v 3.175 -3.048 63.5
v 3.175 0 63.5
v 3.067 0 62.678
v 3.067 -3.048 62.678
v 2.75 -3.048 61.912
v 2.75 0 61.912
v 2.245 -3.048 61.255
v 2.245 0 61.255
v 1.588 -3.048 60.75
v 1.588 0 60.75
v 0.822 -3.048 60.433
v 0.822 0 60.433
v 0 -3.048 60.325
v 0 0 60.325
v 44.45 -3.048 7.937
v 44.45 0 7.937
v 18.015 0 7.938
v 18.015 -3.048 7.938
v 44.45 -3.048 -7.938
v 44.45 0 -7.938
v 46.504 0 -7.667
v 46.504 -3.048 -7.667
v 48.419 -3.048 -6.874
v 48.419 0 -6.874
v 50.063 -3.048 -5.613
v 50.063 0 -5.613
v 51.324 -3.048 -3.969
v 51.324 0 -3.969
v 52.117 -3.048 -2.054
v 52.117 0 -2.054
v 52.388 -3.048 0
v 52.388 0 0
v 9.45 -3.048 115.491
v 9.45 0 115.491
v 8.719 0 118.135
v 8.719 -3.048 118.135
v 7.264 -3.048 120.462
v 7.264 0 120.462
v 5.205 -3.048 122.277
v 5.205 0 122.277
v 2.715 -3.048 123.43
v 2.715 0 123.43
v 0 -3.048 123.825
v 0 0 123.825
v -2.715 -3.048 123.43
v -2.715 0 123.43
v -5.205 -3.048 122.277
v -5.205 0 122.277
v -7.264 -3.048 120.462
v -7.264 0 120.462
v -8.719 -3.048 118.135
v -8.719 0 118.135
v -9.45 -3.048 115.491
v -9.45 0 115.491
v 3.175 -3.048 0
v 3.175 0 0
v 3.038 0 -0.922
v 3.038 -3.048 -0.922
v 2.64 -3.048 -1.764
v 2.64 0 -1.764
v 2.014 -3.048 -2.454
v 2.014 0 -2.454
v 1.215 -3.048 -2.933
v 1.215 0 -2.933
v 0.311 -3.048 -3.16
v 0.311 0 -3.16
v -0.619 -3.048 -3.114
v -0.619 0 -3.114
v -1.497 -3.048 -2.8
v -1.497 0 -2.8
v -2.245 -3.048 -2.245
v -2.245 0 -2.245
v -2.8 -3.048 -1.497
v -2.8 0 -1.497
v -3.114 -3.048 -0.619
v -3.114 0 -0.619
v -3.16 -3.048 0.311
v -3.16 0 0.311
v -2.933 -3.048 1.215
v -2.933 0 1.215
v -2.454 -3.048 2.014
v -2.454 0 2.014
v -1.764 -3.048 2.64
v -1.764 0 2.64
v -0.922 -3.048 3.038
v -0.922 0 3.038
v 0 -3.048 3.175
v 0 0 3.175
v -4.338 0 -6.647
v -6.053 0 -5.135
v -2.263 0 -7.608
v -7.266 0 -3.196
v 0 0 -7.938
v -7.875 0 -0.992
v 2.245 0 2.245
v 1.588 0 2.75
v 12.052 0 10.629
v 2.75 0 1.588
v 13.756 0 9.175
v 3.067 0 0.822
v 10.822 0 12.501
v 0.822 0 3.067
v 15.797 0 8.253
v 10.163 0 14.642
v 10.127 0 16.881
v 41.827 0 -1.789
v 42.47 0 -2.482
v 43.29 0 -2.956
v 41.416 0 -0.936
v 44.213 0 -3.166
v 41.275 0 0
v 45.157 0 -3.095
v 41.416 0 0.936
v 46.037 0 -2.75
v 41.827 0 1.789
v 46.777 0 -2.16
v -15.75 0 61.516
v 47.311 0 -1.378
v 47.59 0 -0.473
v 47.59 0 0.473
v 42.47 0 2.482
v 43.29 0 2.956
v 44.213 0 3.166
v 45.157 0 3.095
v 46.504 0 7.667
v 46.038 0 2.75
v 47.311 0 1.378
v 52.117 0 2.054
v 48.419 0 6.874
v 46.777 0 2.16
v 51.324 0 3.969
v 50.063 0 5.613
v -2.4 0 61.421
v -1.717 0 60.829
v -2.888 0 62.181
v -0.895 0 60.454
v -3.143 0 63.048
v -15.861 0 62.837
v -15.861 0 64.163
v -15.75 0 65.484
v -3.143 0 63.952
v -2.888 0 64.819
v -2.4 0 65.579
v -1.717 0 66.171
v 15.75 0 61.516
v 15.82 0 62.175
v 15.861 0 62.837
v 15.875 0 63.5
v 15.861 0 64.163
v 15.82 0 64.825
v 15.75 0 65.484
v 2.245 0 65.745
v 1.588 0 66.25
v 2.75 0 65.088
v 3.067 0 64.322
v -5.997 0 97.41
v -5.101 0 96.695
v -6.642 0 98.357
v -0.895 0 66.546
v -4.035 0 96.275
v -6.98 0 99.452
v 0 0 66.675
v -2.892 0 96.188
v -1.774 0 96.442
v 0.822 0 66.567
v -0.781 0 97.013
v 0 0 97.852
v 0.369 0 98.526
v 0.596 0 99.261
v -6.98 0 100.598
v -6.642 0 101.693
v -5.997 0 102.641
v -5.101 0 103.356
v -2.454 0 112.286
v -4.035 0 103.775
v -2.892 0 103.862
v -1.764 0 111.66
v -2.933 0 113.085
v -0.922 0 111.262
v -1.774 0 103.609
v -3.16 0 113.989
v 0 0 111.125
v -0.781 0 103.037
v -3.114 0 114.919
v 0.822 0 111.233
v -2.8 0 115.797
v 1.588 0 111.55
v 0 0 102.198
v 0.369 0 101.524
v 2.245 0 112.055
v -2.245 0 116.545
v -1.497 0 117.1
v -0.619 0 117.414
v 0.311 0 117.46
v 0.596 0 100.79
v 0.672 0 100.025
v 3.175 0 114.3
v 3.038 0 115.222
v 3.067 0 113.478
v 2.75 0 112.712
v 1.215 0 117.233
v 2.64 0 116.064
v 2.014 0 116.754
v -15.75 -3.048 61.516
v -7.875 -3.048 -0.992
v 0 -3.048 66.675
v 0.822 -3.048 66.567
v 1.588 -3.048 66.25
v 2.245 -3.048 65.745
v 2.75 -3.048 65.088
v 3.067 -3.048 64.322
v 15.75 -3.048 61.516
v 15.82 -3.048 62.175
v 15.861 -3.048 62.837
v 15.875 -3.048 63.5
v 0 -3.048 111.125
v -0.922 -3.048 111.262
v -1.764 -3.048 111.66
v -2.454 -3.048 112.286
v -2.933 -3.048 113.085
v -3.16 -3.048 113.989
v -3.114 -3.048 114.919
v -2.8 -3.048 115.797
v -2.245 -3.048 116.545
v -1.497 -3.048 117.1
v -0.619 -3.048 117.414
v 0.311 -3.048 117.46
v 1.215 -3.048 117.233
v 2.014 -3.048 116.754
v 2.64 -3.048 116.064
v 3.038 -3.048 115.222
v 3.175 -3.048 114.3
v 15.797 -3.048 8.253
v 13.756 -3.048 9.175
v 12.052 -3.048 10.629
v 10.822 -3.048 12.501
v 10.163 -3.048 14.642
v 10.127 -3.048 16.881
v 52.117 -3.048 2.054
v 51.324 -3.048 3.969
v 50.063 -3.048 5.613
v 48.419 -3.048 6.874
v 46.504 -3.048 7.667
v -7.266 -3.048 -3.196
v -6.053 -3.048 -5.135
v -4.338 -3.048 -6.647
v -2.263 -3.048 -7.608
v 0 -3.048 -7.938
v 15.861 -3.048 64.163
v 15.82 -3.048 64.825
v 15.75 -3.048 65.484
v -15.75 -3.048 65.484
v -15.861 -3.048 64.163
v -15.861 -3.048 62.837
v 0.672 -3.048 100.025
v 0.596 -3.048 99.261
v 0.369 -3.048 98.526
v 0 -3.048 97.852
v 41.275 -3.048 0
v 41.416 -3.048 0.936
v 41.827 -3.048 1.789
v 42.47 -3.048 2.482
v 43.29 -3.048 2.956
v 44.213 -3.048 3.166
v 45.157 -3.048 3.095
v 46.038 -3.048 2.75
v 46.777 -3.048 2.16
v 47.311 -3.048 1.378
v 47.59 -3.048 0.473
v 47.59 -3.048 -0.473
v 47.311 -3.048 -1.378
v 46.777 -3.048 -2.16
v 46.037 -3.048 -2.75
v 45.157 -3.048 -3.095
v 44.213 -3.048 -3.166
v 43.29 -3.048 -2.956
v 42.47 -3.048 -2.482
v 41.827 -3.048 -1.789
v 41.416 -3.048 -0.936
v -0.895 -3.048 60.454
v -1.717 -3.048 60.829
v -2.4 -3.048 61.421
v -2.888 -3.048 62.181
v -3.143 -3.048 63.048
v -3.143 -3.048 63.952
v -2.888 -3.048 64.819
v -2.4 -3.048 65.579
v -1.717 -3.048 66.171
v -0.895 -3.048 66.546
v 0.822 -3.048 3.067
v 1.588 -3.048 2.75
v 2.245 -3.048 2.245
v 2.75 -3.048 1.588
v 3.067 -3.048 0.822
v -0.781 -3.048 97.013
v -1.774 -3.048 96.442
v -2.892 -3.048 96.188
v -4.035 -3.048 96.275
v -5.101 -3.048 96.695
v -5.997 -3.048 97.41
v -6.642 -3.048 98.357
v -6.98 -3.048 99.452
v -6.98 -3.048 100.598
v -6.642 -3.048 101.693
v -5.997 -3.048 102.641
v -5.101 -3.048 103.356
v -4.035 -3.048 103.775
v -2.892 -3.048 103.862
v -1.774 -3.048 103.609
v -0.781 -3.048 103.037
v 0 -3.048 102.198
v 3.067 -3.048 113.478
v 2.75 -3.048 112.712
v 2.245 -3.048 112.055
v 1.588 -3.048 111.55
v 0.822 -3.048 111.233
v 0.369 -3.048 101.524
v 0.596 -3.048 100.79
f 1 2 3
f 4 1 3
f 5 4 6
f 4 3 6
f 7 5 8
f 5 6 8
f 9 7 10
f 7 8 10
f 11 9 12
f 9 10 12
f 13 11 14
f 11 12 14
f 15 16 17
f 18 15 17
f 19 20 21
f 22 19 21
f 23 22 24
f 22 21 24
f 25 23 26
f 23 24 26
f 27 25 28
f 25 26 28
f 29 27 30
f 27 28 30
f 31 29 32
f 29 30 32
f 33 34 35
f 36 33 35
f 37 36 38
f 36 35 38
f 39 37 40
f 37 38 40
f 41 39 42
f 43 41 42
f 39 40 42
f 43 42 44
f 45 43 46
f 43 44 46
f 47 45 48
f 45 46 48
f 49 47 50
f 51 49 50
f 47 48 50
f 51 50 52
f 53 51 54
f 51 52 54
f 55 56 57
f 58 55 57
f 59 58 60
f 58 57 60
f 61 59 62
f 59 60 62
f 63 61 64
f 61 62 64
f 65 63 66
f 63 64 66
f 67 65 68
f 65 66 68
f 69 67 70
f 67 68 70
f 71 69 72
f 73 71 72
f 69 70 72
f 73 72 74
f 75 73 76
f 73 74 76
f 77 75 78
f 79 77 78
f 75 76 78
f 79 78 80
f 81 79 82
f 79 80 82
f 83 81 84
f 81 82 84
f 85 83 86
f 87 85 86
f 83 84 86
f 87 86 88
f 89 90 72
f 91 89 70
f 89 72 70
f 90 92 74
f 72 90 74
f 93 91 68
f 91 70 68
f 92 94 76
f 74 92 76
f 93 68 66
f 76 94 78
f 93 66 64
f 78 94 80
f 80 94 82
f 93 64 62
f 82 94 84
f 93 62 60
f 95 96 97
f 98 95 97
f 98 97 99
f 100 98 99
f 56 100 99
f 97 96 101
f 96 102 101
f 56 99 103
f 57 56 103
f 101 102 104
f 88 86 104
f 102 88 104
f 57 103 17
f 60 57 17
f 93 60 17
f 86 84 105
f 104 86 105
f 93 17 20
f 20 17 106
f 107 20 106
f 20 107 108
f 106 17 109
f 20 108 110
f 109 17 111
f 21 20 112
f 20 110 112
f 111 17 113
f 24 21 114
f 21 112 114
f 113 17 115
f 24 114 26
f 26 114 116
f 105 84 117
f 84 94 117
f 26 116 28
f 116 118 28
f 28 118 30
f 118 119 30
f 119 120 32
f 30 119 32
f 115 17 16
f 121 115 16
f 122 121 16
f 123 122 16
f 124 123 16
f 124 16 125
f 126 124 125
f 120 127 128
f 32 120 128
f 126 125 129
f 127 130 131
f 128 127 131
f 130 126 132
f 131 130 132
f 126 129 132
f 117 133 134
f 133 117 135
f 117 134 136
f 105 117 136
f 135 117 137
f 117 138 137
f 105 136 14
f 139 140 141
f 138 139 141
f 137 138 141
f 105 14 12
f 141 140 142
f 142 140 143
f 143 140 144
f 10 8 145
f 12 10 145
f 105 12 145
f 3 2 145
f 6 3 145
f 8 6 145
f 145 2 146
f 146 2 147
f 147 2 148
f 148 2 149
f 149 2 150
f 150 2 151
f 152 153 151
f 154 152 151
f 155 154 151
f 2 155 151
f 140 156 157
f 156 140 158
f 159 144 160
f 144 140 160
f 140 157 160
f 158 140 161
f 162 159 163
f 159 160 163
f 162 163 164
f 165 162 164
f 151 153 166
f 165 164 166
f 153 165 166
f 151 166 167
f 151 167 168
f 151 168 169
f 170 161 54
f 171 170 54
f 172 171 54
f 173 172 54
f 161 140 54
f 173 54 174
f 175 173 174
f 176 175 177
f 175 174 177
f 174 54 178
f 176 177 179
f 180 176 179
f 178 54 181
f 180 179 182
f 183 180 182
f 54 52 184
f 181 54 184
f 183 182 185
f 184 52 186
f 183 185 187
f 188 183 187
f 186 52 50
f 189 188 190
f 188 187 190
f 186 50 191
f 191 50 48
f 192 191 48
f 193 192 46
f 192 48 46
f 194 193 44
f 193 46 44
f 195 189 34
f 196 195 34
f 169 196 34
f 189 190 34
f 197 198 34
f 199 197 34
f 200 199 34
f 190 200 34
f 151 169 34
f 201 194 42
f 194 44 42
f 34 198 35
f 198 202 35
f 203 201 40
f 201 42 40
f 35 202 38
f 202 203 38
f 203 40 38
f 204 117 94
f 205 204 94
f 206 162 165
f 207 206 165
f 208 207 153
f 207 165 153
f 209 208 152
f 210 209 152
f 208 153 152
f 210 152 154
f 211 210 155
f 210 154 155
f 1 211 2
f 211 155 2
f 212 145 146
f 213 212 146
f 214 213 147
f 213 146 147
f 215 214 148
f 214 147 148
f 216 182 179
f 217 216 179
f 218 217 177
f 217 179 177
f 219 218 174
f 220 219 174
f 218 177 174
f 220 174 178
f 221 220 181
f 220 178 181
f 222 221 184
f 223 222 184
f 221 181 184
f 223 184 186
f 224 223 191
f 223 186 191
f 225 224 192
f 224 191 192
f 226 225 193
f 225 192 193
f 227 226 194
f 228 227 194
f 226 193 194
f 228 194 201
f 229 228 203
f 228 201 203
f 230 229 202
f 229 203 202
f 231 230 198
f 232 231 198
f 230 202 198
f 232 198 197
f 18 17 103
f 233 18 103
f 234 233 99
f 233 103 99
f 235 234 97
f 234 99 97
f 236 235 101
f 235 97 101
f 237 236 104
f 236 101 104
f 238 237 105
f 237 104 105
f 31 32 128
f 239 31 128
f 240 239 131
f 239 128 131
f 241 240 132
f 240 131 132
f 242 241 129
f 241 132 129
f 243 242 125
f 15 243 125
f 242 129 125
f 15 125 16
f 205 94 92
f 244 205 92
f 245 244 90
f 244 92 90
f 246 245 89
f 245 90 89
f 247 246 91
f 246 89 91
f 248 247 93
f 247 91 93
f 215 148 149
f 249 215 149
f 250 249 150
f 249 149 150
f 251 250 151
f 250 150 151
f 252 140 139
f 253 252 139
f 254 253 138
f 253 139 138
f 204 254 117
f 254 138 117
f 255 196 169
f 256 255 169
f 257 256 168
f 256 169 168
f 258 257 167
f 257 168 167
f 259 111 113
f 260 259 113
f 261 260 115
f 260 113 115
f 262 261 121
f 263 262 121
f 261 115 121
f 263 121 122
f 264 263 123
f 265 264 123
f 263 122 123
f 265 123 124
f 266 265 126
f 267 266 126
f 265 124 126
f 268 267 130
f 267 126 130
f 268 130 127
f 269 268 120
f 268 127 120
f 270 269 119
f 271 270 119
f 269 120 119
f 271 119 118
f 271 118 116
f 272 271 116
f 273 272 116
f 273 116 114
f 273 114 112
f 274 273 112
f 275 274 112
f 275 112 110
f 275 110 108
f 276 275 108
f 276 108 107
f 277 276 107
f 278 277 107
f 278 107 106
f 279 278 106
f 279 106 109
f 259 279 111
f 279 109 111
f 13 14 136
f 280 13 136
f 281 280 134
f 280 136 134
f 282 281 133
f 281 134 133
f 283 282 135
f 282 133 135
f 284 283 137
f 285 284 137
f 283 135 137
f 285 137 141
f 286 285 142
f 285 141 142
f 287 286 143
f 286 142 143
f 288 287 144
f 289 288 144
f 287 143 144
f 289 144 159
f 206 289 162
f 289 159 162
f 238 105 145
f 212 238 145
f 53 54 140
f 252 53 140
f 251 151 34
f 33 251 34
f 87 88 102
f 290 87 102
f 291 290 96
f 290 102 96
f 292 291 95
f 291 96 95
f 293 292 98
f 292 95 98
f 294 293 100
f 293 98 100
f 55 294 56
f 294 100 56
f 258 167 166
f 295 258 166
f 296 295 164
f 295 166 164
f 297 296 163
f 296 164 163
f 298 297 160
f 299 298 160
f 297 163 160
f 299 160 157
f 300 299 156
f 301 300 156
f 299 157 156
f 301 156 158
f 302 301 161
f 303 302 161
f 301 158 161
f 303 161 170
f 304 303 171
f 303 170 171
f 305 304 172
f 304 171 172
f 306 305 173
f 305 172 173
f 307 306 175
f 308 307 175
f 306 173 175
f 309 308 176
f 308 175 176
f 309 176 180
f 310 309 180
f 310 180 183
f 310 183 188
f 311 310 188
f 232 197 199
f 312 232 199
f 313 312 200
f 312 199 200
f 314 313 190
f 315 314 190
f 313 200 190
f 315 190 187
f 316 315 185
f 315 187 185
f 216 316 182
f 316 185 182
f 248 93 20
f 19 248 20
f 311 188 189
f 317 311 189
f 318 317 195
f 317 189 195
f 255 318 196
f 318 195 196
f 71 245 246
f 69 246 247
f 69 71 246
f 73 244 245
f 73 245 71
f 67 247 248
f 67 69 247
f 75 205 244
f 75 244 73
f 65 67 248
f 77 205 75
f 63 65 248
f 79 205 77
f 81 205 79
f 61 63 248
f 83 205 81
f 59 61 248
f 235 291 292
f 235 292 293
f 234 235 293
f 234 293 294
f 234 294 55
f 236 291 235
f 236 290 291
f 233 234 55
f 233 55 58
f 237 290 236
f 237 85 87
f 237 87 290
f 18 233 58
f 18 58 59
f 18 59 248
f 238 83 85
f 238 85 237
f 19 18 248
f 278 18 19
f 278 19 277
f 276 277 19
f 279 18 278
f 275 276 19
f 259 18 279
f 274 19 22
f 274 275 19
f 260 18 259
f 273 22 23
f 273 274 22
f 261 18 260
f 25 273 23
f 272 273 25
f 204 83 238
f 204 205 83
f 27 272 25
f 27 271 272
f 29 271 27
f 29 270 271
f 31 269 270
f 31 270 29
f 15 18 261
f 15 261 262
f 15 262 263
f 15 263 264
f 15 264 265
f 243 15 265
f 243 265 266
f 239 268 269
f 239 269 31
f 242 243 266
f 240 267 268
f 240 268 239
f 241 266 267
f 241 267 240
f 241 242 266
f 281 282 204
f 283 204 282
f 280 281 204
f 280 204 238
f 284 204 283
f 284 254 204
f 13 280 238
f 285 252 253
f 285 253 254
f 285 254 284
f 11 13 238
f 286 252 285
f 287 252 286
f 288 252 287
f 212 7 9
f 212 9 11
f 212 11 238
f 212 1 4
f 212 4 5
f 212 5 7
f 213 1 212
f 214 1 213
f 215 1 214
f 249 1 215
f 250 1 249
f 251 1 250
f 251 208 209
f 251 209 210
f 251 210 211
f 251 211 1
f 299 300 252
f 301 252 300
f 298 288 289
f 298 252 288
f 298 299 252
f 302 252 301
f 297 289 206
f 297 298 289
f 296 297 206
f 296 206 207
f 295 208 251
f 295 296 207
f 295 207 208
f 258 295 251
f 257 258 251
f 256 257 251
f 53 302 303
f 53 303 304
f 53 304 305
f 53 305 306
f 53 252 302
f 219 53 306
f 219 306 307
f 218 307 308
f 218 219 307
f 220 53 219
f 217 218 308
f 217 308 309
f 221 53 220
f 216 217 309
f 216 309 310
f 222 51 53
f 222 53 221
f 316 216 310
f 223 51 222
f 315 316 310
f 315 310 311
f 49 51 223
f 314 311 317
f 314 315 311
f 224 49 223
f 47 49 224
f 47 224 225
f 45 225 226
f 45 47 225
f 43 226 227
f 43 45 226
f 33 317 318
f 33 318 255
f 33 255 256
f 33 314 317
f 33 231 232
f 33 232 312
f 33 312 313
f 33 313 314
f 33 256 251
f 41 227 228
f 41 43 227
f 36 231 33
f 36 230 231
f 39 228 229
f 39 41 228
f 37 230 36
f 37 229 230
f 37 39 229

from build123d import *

# Parameters (mm, degrees)
F1_DEPTH = 3.048


with BuildPart() as f1:
    # F0 (on Front) → F1 (new body)
    with BuildSketch(Plane.XZ):
        with BuildLine():
            ThreePointArc((9.4502929642, 115.490625), (0, 123.825), (-9.4502929642, 115.490625))
            ThreePointArc((-9.4502929642, 115.490625), (-7.14375, 107.9998046905), (0, 104.775))
            ThreePointArc((0, 104.775), (6.7351920908, 107.5648079092), (9.525, 114.3))
            ThreePointArc((9.525, 114.3), (9.5063048942, 114.896483242), (9.4502929642, 115.490625))
        make_face()
        with BuildLine():
            ThreePointArc((3.175, 114.3), (2.2450640303, 112.0549359697), (0, 111.125))
            ThreePointArc((0, 111.125), (-2.2450640303, 116.5450640303), (3.175, 114.3))
        make_face(mode=Mode.SUBTRACT)
        with BuildLine():
            Line((-9.4502929642, 115.490625), (-15.7504882737, 65.484375))
            ThreePointArc((-15.7504882737, 65.484375), (-10.5003255158, 75.40625), (0, 79.375))
            Line((0, 79.375), (0, 97.8521401046))
            ThreePointArc((0, 97.8521401046), (-7.0224425673, 100.0252), (0, 102.1982598954))
            Line((0, 102.1982598954), (0, 104.775))
            ThreePointArc((0, 104.775), (-7.14375, 107.9998046905), (-9.4502929642, 115.490625))
        make_face()
        with BuildLine():
            Line((0, 97.8521401046), (0, 79.375))
            ThreePointArc((0, 79.375), (10.5003255158, 75.40625), (15.7504882737, 65.484375))
            Line((15.7504882737, 65.484375), (9.4502929642, 115.490625))
            ThreePointArc((9.4502929642, 115.490625), (9.5063048942, 114.896483242), (9.525, 114.3))
            ThreePointArc((9.525, 114.3), (6.7351920908, 107.5648079092), (0, 104.775))
            Line((0, 104.775), (0, 102.1982598954))
            ThreePointArc((0, 102.1982598954), (0.5004893865, 101.1625618944), (0.6724425673, 100.0252))
            ThreePointArc((0.6724425673, 100.0252), (0.5004893865, 98.8878381056), (0, 97.8521401046))
        make_face()
        with BuildLine():
            Line((0, 47.625), (0, 7.9375))
            ThreePointArc((0, 7.9375), (5.6126600757, 5.6126600757), (7.9375, 0))
            Line((7.9375, 0), (36.5125, 0))
            ThreePointArc((36.5125, 0), (38.8373399243, 5.6126600757), (44.45, 7.9375))
            Line((44.45, 7.9375), (18.0149584735, 7.9375))
            ThreePointArc((18.0149584735, 7.9375), (12.0523084735, 10.6291369817), (10.127113946, 16.881475))
            Line((10.127113946, 16.881475), (15.7504882737, 61.515625))
            ThreePointArc((15.7504882737, 61.515625), (10.5003255158, 51.59375), (0, 47.625))
        make_face()
        with BuildLine():
            Line((0, 60.325), (0, 47.625))
            ThreePointArc((0, 47.625), (10.5003255158, 51.59375), (15.7504882737, 61.515625))
            ThreePointArc((15.7504882737, 61.515625), (15.8438414904, 62.5058612634), (15.875, 63.5))
            ThreePointArc((15.875, 63.5), (15.8438414904, 64.4941387366), (15.7504882737, 65.484375))
            ThreePointArc((15.7504882737, 65.484375), (10.5003255158, 75.40625), (0, 79.375))
            Line((0, 79.375), (0, 66.675))
            ThreePointArc((0, 66.675), (2.2450640303, 65.7450640303), (3.175, 63.5))
            ThreePointArc((3.175, 63.5), (2.2450640303, 61.2549359697), (0, 60.325))
        make_face()
        with BuildLine():
            ThreePointArc((-15.7504882737, 61.515625), (-10.5003255158, 51.59375), (0, 47.625))
            Line((0, 47.625), (0, 60.325))
            ThreePointArc((0, 60.325), (-3.175, 63.5), (0, 66.675))
            Line((0, 66.675), (0, 79.375))
            ThreePointArc((0, 79.375), (-10.5003255158, 75.40625), (-15.7504882737, 65.484375))
            ThreePointArc((-15.7504882737, 65.484375), (-15.875, 63.5), (-15.7504882737, 61.515625))
        make_face()
        with BuildLine():
            ThreePointArc((-7.8752441368, -0.9921875), (-5.953125, 5.2501627579), (0, 7.9375))
            Line((0, 7.9375), (0, 47.625))
            ThreePointArc((0, 47.625), (-10.5003255158, 51.59375), (-15.7504882737, 61.515625))
            Line((-15.7504882737, 61.515625), (-7.8752441368, -0.9921875))
        make_face()
        with BuildLine():
            Line((36.5125, 0), (7.9375, 0))
            ThreePointArc((7.9375, 0), (5.6126600757, -5.6126600757), (0, -7.9375))
            Line((0, -7.9375), (44.45, -7.9375))
            ThreePointArc((44.45, -7.9375), (38.8373399243, -5.6126600757), (36.5125, 0))
        make_face()
        with BuildLine():
            ThreePointArc((44.45, 7.9375), (38.8373399243, 5.6126600757), (36.5125, 0))
            ThreePointArc((36.5125, 0), (38.8373399243, -5.6126600757), (44.45, -7.9375))
            ThreePointArc((44.45, -7.9375), (50.0626600757, -5.6126600757), (52.3875, 0))
            ThreePointArc((52.3875, 0), (50.0626600757, 5.6126600757), (44.45, 7.9375))
        make_face()
        with BuildLine():
            ThreePointArc((47.625, 0), (44.45, -3.175), (41.275, 0))
            ThreePointArc((41.275, 0), (44.45, 3.175), (47.625, 0))
        make_face(mode=Mode.SUBTRACT)
        with BuildLine():
            ThreePointArc((3.175, 0), (-2.2450640303, -2.2450640303), (0, 3.175))
            Line((0, 3.175), (0, 7.9375))
            ThreePointArc((0, 7.9375), (-5.953125, 5.2501627579), (-7.8752441368, -0.9921875))
            ThreePointArc((-7.8752441368, -0.9921875), (-5.2501627579, -5.953125), (0, -7.9375))
            ThreePointArc((0, -7.9375), (5.6126600757, -5.6126600757), (7.9375, 0))
            Line((7.9375, 0), (3.175, 0))
        make_face()
        with BuildLine():
            Line((0, 7.9375), (0, 3.175))
            ThreePointArc((0, 3.175), (2.2450640303, 2.2450640303), (3.175, 0))
            Line((3.175, 0), (7.9375, 0))
            ThreePointArc((7.9375, 0), (5.6126600757, 5.6126600757), (0, 7.9375))
        make_face()
    extrude(amount=F1_DEPTH)


solid = f1.part
